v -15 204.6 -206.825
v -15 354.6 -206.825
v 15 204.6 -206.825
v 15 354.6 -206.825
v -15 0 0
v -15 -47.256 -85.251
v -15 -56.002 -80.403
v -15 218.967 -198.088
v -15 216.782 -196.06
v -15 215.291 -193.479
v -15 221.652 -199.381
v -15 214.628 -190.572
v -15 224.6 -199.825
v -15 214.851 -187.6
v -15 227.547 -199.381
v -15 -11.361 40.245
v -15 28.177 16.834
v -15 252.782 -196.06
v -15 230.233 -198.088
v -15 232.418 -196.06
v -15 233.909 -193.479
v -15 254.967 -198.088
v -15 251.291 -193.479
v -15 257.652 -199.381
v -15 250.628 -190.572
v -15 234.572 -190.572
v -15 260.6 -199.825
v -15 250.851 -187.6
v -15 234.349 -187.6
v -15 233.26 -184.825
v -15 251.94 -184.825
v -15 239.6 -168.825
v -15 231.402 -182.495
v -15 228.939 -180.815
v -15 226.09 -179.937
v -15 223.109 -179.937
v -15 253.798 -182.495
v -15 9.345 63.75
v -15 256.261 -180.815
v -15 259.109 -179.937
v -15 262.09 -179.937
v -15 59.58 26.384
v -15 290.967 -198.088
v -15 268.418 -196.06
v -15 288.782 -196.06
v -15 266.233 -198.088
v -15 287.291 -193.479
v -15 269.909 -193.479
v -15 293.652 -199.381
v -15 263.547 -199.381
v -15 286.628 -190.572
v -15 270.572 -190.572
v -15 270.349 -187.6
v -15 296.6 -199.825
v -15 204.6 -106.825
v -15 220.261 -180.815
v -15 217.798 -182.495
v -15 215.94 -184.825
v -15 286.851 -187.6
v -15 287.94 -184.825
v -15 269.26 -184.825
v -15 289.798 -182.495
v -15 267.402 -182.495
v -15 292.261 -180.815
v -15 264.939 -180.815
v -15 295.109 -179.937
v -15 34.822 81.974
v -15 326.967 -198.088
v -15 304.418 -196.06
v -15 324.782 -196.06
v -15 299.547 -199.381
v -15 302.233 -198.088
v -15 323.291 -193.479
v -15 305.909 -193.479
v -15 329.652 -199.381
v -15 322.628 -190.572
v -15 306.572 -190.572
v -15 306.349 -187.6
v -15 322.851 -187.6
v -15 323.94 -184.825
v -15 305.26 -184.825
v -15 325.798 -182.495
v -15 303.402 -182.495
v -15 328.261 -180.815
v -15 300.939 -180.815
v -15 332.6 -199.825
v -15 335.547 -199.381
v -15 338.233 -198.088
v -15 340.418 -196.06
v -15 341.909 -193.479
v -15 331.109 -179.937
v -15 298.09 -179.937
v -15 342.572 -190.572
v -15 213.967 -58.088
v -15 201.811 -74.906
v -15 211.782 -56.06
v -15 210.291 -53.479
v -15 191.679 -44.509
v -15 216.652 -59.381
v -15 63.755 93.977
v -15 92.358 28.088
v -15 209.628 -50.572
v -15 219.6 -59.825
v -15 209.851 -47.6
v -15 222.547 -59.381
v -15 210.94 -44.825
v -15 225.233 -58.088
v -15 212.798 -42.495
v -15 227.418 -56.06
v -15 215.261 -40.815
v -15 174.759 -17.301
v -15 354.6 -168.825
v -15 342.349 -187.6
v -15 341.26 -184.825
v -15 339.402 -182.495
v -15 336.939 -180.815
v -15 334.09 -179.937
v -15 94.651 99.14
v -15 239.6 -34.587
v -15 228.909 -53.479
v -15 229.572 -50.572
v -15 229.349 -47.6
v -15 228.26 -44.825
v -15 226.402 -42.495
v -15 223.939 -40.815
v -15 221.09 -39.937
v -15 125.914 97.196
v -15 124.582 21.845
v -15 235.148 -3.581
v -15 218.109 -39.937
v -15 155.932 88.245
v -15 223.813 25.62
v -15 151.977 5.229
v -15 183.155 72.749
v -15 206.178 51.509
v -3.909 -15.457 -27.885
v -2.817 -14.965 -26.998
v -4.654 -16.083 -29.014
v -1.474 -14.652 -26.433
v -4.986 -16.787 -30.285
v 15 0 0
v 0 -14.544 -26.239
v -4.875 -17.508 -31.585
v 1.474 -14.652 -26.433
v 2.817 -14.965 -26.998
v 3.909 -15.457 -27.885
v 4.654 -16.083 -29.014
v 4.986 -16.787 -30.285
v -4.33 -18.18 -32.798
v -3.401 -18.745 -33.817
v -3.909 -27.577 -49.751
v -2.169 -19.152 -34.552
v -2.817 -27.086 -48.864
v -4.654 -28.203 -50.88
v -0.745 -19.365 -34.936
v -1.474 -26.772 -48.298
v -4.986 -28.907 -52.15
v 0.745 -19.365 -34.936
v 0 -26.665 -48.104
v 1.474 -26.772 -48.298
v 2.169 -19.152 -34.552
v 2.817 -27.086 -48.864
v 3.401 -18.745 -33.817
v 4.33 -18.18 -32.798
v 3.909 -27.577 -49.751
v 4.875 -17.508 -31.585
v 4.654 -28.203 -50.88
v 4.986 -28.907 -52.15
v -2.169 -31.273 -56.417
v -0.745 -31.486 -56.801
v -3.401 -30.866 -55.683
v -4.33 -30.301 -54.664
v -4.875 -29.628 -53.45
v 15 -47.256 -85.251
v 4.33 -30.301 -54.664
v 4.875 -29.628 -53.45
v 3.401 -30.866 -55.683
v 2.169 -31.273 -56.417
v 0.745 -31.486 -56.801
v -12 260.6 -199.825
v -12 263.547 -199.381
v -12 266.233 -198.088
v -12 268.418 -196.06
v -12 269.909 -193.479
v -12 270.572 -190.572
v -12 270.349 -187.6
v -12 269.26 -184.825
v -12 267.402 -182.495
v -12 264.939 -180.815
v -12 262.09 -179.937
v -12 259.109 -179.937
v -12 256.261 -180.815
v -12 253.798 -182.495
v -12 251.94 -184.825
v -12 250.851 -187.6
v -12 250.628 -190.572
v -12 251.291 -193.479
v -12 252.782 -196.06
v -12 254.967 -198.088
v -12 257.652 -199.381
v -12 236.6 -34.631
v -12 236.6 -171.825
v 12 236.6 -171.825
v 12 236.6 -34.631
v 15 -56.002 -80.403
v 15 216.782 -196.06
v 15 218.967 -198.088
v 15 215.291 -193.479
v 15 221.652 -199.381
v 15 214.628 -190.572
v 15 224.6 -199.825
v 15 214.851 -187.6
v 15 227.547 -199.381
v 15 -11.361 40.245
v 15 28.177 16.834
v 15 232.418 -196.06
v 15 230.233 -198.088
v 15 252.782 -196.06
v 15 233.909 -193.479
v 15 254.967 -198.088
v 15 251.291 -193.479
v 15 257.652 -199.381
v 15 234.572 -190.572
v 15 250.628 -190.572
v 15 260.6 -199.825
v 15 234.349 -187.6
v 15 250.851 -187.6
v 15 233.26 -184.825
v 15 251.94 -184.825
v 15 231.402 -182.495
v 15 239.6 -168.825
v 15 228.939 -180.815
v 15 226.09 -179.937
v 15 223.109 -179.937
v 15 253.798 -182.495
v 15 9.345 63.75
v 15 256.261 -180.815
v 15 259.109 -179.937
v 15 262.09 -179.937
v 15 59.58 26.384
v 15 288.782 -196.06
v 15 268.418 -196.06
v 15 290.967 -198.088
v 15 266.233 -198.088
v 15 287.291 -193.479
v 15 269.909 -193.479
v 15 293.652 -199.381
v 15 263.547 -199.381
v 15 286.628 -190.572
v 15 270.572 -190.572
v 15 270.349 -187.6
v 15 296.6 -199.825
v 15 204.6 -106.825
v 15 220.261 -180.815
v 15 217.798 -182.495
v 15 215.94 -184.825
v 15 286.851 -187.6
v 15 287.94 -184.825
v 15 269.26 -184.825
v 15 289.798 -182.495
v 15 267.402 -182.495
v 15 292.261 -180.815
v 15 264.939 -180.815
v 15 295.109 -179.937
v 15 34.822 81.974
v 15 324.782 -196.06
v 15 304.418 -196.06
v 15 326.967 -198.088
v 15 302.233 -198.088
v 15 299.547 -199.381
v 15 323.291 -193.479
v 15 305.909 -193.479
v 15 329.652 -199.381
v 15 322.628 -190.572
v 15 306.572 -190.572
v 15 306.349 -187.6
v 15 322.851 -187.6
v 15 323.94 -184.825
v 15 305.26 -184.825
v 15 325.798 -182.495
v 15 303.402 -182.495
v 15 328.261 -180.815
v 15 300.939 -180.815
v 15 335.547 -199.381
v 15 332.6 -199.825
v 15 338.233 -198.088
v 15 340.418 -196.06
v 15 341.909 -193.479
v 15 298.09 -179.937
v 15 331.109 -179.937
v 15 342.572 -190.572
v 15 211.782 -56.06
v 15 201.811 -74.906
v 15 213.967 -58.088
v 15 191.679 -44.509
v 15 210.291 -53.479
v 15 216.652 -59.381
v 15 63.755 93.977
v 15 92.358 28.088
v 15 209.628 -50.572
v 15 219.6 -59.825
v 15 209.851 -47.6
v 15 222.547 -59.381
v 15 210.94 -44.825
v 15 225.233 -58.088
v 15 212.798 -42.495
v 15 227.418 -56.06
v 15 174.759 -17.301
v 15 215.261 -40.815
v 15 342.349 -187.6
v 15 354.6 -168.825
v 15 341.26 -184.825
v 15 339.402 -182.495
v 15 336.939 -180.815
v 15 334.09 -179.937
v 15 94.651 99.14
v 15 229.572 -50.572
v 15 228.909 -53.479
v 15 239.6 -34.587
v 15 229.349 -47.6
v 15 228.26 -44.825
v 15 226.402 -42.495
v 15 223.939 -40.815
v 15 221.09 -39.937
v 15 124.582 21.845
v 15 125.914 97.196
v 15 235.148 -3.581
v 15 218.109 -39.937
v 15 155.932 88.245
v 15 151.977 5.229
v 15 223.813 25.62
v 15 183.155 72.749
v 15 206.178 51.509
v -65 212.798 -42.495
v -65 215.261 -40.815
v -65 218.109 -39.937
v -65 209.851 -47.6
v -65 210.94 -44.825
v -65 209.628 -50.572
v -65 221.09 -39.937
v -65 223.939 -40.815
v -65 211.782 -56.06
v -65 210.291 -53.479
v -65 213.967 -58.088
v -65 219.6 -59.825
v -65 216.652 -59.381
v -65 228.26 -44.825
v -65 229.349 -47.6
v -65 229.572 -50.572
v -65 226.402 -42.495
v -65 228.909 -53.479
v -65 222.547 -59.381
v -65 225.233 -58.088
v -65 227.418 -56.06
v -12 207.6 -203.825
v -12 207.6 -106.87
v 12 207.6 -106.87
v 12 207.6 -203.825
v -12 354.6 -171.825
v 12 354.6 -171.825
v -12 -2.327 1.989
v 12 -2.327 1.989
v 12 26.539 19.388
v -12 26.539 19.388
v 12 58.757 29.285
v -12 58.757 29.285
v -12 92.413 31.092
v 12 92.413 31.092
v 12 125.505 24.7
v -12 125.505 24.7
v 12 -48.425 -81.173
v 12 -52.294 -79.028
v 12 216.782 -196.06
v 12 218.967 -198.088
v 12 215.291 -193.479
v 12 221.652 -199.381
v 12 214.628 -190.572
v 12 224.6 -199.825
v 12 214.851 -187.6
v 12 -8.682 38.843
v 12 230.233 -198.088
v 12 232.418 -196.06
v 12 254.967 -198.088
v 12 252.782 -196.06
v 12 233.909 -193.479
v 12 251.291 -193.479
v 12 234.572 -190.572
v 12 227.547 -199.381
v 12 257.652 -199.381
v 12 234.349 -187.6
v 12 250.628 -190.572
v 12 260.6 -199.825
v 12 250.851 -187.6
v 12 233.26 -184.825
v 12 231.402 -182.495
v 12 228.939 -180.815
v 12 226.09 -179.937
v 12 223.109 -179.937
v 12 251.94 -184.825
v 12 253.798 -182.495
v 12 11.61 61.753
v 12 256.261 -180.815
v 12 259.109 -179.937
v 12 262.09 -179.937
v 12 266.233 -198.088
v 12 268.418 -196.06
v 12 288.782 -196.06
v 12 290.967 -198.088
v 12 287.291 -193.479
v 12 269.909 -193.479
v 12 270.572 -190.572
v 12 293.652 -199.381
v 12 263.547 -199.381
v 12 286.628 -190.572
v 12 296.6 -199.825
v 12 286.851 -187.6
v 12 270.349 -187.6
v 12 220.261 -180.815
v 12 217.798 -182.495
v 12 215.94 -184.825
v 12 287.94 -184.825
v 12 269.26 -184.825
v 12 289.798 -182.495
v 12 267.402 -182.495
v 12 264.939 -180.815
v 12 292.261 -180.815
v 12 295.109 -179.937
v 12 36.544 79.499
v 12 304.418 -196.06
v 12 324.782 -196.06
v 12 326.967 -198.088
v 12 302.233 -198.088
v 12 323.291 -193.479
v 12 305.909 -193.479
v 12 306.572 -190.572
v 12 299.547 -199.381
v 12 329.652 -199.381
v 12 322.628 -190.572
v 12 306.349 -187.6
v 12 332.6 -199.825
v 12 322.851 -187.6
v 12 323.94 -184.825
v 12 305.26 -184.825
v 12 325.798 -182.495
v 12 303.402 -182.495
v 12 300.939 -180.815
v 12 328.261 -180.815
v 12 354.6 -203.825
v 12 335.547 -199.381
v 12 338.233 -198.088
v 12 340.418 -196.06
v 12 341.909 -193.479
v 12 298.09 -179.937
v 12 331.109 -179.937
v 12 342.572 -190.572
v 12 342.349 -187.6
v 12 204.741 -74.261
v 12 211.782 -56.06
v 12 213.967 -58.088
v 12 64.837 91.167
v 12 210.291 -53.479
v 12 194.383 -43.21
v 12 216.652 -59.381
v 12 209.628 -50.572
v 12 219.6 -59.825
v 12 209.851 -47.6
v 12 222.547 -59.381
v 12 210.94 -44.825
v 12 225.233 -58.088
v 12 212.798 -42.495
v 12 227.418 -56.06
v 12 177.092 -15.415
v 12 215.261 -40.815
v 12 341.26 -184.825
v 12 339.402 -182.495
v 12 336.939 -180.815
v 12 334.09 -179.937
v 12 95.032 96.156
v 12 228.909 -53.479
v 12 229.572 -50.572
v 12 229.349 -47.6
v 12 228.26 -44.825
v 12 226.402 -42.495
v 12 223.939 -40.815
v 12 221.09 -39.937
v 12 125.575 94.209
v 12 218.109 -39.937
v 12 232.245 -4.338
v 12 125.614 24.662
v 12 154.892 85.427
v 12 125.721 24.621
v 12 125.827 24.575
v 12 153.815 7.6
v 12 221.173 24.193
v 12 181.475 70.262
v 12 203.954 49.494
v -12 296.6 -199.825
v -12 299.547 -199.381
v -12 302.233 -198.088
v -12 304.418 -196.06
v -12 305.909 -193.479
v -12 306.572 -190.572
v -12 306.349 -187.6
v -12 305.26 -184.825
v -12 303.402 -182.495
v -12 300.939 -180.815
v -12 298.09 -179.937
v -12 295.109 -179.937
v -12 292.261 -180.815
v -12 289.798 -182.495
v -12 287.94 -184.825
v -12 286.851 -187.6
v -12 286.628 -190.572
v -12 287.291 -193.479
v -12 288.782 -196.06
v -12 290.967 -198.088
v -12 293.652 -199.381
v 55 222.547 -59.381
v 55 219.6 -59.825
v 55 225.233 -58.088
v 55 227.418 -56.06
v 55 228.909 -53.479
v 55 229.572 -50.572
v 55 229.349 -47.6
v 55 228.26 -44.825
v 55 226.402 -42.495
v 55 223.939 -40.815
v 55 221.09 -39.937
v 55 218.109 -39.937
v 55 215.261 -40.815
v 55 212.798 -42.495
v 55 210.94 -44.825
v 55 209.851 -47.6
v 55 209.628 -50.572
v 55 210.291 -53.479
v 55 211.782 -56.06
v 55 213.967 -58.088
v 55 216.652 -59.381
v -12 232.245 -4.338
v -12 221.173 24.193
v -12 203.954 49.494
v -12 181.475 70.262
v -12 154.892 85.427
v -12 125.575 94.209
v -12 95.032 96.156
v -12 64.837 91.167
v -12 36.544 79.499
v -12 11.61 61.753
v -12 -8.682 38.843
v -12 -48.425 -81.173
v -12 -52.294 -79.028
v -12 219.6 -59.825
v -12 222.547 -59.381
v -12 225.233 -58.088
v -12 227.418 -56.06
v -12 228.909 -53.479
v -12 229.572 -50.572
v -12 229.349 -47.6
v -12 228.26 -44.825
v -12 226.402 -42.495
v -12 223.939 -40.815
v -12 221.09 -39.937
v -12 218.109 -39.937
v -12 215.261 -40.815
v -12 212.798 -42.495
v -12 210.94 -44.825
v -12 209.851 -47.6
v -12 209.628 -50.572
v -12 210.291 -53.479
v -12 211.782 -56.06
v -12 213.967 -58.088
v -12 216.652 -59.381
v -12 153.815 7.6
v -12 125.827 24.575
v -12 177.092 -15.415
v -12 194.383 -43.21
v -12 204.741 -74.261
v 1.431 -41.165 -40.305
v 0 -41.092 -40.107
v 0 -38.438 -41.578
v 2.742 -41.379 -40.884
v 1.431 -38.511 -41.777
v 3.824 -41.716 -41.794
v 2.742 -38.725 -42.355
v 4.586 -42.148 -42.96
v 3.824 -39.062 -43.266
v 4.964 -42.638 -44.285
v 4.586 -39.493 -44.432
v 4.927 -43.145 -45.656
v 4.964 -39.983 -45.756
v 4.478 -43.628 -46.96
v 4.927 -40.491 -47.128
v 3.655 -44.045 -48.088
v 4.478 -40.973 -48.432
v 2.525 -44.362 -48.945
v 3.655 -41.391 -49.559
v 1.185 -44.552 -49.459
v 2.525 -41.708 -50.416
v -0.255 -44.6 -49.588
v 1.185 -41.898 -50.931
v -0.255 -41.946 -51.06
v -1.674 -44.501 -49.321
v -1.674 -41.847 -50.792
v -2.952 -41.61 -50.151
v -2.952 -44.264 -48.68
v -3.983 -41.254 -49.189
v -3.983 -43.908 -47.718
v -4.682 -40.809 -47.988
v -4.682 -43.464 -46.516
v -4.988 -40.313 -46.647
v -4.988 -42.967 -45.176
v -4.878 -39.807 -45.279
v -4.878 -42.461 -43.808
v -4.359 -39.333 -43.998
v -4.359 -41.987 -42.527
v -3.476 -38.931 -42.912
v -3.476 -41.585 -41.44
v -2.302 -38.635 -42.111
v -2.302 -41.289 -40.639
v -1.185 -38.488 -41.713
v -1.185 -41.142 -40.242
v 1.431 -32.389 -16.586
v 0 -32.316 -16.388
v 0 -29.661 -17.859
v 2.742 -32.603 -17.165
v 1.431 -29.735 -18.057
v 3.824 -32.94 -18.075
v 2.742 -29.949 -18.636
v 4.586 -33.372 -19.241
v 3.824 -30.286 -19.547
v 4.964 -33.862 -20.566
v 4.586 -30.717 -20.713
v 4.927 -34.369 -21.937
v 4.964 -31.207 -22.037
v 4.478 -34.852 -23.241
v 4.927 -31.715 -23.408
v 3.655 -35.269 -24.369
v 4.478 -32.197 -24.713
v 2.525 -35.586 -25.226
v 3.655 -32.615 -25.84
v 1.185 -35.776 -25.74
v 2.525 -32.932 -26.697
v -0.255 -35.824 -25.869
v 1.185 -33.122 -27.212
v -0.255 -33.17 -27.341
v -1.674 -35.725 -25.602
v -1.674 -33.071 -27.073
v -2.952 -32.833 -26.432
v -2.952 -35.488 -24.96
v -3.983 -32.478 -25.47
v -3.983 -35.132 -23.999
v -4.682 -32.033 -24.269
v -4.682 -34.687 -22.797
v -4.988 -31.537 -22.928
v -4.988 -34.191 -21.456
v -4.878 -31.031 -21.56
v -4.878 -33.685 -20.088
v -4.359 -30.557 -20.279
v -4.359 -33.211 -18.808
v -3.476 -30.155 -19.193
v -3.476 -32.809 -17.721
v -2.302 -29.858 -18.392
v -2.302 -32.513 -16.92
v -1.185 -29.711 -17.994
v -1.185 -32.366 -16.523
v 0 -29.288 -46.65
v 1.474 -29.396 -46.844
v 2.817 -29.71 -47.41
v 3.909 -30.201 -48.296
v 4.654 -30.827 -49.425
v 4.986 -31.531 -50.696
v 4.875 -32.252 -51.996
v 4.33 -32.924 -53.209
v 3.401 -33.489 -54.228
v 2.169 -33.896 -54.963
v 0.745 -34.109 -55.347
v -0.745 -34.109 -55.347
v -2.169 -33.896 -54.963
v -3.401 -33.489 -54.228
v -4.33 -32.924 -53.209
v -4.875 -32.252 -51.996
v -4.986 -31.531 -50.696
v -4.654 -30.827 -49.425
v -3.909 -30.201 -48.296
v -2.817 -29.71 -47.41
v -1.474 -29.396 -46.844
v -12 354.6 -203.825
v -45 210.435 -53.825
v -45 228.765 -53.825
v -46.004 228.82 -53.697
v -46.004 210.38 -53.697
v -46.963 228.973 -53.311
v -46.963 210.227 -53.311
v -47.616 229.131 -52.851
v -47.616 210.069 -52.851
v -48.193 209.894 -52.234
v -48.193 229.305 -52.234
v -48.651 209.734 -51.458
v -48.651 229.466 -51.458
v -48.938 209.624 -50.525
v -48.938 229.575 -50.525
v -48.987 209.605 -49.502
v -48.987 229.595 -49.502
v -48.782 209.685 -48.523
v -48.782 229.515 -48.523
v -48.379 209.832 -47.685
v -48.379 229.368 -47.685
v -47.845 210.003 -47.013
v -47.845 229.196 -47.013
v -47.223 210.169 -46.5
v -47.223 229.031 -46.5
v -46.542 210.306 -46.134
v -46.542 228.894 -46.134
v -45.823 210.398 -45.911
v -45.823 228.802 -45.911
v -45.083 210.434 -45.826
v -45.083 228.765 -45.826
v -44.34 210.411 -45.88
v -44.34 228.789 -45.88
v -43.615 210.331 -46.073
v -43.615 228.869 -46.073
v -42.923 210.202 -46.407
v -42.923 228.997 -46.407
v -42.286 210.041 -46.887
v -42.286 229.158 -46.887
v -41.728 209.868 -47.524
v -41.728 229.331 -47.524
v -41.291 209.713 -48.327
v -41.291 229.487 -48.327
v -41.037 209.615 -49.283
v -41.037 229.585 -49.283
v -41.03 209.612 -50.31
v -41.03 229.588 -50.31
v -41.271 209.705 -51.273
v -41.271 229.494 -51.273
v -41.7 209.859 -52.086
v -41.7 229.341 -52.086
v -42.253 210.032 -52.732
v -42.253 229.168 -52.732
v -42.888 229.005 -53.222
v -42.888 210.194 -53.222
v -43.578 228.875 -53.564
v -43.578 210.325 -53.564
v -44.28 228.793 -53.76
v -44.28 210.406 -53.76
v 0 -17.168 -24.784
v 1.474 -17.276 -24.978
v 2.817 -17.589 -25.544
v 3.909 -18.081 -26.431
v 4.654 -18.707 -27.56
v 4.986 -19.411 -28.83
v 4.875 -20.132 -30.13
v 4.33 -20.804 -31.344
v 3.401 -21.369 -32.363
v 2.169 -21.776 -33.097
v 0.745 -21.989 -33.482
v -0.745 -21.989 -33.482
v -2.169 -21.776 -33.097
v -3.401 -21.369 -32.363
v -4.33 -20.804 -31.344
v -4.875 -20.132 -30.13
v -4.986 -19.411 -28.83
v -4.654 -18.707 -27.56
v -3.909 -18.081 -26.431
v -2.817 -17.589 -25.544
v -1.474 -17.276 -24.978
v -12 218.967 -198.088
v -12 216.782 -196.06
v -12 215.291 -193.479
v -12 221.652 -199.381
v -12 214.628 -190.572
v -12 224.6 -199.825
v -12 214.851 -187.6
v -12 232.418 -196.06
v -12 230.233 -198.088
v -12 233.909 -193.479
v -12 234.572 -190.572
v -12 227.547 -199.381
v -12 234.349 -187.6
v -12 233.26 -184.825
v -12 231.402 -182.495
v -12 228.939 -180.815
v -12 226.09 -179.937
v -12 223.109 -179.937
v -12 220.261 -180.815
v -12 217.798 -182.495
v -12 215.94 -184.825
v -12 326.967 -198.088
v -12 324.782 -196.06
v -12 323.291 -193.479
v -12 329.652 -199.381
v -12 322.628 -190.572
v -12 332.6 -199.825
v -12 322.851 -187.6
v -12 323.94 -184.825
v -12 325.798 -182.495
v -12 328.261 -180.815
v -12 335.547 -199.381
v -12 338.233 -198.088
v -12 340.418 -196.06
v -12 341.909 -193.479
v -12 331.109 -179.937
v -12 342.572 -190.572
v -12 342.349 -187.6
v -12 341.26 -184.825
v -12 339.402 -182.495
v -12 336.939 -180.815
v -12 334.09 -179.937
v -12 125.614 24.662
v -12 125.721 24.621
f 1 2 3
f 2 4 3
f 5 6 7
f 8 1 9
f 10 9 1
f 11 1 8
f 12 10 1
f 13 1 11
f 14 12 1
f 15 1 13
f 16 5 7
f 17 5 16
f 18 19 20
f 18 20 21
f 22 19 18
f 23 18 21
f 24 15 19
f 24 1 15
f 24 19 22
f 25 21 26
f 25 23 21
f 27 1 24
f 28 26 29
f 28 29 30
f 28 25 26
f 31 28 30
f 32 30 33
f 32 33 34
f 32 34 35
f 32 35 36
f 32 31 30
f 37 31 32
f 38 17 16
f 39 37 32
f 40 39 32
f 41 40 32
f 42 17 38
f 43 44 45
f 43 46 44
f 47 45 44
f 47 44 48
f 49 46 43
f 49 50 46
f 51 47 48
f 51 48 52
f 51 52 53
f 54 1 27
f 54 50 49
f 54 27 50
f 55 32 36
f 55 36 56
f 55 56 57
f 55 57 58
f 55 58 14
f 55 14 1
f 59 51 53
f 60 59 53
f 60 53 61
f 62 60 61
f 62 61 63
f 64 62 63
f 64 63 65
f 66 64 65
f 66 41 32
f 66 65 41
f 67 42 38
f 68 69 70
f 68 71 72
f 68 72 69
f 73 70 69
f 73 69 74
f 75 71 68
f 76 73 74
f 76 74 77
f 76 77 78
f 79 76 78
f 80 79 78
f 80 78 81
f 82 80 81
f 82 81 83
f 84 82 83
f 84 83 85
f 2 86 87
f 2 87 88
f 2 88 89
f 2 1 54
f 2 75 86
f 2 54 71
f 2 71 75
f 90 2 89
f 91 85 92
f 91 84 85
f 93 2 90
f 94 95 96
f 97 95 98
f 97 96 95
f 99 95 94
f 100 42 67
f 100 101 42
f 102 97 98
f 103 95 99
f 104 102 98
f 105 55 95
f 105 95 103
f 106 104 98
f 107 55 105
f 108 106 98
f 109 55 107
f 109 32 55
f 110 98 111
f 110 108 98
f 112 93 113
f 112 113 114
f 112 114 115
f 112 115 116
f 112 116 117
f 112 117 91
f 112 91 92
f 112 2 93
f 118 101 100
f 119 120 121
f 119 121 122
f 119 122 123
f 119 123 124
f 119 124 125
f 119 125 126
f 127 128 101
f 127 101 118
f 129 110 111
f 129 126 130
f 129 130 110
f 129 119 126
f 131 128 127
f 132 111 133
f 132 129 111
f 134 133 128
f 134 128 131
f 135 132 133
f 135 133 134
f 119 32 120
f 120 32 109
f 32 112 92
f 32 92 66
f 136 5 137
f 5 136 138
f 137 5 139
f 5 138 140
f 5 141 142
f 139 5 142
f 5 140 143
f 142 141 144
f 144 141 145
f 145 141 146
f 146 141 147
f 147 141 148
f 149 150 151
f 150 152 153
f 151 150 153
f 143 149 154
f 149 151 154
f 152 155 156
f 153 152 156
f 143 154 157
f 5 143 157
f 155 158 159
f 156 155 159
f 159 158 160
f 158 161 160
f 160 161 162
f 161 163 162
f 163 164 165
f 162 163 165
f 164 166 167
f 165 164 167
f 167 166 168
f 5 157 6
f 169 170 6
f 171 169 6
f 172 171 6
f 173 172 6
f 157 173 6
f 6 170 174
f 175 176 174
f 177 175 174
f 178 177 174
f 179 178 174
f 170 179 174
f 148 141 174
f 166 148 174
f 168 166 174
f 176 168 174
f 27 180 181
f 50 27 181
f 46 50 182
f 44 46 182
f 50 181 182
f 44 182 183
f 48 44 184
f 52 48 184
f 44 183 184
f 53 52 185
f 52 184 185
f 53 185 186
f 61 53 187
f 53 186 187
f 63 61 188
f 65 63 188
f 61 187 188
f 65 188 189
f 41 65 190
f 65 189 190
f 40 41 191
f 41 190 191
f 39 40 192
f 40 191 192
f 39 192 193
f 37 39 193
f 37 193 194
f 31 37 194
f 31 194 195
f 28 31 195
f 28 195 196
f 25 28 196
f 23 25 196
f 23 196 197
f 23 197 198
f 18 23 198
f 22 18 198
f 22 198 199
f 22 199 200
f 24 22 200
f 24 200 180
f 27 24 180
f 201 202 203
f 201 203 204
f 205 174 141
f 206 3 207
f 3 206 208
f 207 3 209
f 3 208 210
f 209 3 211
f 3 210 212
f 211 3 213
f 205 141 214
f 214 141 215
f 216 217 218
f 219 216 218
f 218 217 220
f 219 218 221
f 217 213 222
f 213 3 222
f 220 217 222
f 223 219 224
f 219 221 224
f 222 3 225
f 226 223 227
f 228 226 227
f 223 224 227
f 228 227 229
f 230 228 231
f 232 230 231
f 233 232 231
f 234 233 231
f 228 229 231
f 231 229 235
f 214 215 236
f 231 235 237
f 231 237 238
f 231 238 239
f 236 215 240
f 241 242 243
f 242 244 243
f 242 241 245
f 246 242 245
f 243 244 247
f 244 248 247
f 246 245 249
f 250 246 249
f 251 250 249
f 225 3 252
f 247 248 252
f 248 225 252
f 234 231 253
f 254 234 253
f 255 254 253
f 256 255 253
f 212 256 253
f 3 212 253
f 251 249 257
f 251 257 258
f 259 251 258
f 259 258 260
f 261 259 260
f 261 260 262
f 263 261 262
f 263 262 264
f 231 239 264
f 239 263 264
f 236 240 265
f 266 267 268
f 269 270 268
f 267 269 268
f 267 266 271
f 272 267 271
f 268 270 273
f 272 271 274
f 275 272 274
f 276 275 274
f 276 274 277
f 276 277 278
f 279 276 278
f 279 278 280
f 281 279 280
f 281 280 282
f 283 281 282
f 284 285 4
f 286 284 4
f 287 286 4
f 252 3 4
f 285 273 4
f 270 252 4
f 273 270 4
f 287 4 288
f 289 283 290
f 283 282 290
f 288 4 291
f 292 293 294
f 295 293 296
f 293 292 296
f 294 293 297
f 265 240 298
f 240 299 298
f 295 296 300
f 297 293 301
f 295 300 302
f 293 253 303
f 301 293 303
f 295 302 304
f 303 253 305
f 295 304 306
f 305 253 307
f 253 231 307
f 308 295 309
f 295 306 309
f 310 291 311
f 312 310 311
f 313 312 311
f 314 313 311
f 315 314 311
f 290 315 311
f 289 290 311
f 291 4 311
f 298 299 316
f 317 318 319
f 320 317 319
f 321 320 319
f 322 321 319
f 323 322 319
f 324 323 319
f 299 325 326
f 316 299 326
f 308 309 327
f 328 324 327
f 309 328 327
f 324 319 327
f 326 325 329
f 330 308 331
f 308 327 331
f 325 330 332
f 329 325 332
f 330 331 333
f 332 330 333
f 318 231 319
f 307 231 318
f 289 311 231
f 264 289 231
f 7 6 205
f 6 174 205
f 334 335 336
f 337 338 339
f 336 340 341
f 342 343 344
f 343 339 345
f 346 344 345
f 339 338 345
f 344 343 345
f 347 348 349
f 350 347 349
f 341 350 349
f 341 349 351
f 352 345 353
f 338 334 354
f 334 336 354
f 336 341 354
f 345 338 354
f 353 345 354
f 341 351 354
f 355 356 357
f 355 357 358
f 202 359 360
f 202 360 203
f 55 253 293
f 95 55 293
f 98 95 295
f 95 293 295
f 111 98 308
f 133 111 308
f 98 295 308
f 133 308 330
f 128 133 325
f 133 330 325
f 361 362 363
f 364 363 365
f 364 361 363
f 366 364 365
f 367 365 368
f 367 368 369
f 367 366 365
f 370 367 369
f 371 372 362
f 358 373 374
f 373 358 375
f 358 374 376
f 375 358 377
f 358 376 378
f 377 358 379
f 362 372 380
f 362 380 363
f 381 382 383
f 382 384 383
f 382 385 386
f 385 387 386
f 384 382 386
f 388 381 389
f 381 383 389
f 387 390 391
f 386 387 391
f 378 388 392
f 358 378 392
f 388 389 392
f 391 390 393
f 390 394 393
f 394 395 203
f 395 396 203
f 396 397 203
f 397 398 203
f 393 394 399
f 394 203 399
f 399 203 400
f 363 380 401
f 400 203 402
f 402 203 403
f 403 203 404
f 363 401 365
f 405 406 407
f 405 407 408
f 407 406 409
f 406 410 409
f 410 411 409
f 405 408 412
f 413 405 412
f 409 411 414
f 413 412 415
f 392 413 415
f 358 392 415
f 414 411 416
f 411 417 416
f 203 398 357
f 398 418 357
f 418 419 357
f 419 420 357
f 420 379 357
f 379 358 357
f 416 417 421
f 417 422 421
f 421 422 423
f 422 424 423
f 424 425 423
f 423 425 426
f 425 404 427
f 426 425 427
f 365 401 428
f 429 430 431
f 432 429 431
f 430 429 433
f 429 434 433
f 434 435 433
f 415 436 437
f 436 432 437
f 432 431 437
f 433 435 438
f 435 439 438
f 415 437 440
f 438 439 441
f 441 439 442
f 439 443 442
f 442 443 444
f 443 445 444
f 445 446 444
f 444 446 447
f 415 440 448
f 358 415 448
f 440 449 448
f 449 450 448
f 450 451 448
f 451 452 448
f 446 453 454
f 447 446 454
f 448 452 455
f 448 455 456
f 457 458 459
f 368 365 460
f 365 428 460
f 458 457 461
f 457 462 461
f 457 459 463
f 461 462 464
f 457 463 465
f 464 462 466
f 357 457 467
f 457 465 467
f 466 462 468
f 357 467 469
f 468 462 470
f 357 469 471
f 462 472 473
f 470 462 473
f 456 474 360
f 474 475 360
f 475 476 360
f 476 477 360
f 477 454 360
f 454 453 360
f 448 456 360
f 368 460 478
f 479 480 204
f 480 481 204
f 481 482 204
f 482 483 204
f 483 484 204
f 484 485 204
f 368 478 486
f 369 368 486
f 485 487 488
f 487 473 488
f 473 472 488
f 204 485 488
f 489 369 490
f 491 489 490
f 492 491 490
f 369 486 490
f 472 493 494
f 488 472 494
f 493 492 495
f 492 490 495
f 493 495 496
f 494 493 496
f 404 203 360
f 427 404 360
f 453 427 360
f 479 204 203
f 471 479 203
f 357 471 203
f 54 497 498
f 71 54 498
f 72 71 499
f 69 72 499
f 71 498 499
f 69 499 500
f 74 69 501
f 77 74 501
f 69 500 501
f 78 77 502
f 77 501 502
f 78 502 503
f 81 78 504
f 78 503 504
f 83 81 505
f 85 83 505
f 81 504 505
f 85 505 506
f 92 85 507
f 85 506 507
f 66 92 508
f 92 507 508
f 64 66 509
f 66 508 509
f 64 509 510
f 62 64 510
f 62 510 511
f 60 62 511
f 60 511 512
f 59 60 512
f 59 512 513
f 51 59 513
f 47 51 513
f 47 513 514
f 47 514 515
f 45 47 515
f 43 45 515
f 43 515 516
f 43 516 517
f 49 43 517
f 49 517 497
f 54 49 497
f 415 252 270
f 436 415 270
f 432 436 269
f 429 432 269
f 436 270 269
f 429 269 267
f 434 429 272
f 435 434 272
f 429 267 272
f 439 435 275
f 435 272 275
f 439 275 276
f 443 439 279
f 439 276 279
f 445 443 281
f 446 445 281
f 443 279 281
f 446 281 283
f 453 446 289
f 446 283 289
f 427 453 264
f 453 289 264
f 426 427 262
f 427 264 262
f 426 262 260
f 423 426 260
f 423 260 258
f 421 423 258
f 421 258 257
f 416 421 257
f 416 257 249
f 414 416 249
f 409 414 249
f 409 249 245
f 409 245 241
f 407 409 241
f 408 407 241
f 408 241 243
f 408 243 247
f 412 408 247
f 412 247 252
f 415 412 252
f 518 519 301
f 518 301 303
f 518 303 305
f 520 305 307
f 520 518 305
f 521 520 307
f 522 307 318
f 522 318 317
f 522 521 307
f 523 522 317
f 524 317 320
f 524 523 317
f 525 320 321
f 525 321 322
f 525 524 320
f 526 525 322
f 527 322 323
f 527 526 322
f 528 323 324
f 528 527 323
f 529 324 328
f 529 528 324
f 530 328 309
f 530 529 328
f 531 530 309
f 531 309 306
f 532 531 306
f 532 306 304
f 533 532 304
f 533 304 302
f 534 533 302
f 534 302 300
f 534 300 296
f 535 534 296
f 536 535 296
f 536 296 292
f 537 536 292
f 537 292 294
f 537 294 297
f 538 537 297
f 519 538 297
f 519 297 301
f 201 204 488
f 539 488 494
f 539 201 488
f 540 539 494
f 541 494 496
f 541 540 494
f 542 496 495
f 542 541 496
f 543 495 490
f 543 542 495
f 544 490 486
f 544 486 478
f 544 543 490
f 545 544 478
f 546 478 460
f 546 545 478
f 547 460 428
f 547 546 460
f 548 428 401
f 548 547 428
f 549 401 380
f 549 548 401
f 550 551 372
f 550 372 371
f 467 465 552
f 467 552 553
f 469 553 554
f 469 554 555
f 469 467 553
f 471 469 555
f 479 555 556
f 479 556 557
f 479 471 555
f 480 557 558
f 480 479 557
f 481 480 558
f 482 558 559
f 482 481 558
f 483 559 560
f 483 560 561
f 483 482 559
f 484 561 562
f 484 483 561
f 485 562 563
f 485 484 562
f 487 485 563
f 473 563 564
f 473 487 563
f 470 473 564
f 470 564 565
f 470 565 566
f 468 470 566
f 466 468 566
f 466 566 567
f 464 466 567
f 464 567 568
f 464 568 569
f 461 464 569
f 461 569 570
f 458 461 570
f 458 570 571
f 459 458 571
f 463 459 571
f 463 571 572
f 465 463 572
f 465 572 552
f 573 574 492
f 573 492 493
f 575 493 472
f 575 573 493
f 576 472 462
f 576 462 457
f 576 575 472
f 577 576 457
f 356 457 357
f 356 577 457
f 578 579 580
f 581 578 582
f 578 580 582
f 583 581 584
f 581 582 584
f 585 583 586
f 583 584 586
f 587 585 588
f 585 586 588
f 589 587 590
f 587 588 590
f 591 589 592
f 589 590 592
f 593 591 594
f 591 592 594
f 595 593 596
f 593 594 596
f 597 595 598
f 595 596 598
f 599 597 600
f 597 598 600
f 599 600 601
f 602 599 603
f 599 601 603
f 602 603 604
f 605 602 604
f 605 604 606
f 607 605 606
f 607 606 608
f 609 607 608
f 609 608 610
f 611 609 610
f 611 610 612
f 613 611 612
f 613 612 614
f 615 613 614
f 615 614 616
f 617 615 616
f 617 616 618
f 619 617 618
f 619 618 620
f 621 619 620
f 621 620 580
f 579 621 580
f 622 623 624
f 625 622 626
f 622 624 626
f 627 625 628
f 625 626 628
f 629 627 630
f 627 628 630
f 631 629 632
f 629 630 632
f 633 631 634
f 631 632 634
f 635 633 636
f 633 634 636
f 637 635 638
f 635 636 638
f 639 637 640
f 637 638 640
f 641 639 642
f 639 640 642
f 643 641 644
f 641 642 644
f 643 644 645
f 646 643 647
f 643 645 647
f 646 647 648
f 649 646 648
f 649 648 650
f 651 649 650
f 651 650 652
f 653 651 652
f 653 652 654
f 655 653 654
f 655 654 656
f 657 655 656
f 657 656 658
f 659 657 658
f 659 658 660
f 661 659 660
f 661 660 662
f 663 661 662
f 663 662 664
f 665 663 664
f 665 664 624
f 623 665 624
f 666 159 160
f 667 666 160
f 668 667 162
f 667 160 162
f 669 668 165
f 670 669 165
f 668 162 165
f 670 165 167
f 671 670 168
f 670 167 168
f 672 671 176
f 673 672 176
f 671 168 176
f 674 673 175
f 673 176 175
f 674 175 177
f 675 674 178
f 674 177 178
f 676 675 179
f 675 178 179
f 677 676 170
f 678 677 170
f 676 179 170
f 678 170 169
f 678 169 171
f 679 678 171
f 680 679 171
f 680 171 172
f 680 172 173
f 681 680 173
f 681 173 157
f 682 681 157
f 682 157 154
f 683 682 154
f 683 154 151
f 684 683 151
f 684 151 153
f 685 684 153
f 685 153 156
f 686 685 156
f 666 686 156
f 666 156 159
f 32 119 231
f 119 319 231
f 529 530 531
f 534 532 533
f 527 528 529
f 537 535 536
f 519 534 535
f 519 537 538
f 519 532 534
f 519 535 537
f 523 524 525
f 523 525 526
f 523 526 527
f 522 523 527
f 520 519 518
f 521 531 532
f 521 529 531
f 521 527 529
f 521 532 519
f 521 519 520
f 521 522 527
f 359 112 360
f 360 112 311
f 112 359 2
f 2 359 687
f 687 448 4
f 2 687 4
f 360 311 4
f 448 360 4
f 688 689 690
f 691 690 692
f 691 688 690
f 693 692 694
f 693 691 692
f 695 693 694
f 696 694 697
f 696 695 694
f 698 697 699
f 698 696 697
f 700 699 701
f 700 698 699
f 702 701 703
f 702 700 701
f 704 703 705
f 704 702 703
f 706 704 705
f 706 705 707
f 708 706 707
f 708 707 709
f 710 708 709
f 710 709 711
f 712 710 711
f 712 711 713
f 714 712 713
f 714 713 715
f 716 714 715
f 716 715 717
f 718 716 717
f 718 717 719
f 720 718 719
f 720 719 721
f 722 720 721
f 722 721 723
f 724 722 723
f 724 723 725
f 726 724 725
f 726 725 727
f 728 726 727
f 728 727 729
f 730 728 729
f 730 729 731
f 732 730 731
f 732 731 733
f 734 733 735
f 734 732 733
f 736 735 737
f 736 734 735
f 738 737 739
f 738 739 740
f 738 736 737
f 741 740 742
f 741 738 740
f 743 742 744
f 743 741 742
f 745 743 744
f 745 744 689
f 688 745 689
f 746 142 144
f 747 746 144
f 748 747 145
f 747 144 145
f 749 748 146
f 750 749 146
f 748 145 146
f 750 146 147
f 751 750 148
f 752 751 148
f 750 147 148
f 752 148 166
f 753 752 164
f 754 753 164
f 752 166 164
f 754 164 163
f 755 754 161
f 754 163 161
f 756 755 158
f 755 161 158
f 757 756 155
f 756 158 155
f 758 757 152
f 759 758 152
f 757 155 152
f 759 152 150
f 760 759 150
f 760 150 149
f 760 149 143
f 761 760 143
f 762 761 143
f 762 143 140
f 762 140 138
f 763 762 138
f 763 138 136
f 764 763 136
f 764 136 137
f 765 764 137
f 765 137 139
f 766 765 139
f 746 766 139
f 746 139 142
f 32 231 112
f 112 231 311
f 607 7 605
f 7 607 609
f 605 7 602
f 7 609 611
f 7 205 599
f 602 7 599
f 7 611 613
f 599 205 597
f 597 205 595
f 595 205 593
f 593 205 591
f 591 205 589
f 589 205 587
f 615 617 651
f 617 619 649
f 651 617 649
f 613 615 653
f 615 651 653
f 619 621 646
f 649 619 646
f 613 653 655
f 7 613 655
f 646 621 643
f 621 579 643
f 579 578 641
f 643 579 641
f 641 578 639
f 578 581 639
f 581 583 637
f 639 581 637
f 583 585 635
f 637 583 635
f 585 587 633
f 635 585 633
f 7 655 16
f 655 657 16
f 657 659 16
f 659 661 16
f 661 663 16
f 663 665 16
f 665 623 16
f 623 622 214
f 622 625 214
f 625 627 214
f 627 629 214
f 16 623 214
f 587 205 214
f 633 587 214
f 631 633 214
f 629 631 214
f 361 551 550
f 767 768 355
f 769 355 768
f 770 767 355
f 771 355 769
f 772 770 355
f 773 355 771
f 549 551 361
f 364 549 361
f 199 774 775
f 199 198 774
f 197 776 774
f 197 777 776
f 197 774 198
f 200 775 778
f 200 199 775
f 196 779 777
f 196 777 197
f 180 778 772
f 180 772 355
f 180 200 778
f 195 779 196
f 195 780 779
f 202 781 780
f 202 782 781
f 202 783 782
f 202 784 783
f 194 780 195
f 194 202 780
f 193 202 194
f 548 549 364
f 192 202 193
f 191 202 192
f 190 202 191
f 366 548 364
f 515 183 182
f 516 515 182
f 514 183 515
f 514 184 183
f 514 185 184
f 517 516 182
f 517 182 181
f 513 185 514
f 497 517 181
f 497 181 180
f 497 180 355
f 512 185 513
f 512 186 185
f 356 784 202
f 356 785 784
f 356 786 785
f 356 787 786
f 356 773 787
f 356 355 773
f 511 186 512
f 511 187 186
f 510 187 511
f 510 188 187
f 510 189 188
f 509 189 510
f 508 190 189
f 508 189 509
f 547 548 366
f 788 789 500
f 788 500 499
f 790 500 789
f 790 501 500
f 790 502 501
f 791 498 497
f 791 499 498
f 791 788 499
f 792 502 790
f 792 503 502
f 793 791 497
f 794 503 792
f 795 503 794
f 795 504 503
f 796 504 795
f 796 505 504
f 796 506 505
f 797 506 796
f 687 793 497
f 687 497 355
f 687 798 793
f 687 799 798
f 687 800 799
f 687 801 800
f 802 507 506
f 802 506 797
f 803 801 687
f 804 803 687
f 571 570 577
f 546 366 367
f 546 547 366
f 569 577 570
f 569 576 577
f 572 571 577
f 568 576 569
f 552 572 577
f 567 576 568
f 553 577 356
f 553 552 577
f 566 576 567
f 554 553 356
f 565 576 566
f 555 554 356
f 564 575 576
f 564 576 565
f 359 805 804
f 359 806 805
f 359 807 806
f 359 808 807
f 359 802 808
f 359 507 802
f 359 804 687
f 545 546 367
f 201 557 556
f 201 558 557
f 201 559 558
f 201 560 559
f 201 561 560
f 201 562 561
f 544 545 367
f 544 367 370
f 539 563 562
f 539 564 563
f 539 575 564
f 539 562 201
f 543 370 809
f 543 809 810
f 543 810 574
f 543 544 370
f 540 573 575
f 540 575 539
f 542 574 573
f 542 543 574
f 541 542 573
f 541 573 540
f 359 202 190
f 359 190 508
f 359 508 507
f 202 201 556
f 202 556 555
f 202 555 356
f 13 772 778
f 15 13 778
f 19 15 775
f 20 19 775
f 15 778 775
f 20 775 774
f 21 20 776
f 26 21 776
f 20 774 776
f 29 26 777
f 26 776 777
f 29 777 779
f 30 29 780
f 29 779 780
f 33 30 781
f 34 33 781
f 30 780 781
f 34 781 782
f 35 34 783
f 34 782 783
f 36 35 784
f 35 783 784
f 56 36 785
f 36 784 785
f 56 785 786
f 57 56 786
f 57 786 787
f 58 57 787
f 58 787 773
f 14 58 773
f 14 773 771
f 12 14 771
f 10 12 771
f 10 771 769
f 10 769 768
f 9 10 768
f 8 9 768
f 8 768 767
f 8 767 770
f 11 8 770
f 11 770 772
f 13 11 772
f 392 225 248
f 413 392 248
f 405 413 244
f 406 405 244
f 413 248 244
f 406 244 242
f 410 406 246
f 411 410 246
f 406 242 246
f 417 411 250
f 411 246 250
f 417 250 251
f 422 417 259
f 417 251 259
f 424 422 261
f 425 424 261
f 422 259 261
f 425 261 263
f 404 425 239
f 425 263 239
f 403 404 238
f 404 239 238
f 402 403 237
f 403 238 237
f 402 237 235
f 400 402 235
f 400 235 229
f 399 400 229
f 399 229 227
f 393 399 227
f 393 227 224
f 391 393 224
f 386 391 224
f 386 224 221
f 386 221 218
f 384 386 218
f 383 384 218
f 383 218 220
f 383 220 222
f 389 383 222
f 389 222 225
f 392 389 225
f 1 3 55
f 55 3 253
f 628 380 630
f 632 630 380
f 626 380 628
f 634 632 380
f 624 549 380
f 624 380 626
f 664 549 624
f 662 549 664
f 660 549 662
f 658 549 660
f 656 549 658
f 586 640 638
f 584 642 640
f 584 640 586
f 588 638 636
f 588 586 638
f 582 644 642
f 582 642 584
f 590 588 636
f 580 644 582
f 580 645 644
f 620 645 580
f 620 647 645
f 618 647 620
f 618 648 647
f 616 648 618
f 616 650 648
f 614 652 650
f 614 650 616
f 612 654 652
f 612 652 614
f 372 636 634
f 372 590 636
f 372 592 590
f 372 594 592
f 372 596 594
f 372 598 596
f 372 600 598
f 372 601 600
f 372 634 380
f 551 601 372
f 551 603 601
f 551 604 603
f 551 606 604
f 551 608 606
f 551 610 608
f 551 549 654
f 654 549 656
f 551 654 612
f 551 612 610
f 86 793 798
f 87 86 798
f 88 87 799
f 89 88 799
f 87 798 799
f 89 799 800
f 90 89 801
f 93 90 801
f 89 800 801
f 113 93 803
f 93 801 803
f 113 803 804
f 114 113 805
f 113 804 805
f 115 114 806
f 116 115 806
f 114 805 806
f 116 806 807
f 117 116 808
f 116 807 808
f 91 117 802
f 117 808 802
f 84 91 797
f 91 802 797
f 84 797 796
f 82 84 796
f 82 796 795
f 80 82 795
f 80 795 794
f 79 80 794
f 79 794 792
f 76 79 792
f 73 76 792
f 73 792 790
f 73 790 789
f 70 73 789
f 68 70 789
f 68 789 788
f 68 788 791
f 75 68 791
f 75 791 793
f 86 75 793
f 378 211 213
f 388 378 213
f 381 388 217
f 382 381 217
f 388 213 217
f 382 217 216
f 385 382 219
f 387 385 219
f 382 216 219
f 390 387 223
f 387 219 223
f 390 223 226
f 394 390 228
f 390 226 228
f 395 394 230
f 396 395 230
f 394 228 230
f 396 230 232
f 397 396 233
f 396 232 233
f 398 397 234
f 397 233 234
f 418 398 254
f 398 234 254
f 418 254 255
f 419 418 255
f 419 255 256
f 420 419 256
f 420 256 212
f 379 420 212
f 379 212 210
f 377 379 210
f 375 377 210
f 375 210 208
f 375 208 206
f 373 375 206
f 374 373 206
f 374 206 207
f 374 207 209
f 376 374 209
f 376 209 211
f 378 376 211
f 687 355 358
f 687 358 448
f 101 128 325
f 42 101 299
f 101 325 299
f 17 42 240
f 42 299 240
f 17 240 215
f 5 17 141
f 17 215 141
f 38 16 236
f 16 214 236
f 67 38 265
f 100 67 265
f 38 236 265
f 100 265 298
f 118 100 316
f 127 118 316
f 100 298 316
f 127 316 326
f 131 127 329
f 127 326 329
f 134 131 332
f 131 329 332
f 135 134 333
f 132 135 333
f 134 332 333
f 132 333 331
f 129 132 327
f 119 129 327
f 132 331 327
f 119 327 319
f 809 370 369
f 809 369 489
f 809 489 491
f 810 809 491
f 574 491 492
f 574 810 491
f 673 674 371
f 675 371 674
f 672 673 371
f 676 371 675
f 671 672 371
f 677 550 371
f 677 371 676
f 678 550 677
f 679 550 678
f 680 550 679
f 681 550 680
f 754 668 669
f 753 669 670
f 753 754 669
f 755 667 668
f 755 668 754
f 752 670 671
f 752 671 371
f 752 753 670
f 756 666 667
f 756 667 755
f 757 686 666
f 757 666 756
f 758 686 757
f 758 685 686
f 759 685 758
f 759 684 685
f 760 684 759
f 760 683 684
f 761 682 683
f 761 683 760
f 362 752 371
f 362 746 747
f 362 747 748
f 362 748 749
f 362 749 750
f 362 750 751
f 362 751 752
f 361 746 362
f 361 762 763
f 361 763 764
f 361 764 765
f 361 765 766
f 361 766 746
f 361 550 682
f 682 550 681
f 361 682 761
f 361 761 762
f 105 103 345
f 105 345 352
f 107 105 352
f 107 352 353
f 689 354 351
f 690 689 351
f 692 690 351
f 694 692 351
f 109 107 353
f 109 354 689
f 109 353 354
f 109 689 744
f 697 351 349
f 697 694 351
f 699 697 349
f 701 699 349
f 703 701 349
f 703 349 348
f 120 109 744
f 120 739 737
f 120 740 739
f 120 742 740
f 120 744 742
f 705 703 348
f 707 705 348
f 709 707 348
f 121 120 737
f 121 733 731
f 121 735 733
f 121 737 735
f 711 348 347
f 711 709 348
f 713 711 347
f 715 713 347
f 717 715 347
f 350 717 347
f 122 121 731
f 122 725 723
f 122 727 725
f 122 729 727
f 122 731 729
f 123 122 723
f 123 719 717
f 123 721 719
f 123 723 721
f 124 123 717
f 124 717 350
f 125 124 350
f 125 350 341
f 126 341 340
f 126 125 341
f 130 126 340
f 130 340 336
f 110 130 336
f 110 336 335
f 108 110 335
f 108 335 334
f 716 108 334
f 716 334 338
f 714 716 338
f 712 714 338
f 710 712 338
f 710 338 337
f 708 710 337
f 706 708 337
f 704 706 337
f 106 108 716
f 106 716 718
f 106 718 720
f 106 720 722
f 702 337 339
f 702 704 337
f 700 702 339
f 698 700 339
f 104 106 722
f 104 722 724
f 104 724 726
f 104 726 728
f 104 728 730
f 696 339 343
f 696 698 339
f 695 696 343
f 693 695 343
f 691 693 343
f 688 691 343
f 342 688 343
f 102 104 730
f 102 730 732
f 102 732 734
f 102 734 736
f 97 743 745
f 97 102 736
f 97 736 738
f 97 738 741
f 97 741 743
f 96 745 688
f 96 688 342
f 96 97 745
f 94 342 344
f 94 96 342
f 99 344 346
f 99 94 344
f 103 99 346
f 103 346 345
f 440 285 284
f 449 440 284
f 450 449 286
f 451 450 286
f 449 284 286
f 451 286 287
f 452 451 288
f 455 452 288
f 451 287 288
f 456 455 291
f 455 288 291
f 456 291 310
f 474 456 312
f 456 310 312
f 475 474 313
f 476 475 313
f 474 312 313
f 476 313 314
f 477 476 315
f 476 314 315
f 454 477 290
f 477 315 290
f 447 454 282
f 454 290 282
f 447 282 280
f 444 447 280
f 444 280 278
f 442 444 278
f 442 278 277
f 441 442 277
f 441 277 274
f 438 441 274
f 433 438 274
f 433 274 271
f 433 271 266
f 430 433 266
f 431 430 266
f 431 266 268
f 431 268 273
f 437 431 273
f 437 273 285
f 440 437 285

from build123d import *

# Parameters (mm, degrees)
BOSS_EXTRUDE1_DEPTH = 15
SHELL1_START        = -12
SHELL1_DEPTH        = 24
SKETCH3_R           = 10
CUT_EXTRUDE2_DEPTH  = 412.603799071
BOSS_EXTRUDE2_START = 40
SKETCH4_R           = 10
BOSS_EXTRUDE2_DEPTH = 120
LPATTERN1_COUNT     = 4
LPATTERN1_PITCH     = 36
SKETCH6_R           = 5
CUT_EXTRUDE3_DEPTH  = 416.623251767
CUT_EXTRUDE4_REACH  = 417.623
SKETCH7_R           = 4


# Read off the part's stored shape, not the designer's step: Shell1
with BuildPart() as part:
    # Sketch1 → Boss-Extrude1 (new, symmetric)
    with BuildSketch(Plane(origin=(0, 0, 0), x_dir=(0, 0, -1), z_dir=(1, 0, 0))):
        with BuildLine():
            Line((0, 0), (85.251371582, -47.255606917))
            Line((85.251371582, -47.255606917), (80.40327538, -56.001803988))
            Line((80.40327538, -56.001803988), (-40.245063676, -11.361449965))
            ThreePointArc((-40.245063676, -11.361449965), (-93.575565654, 141.17838747), (34.587469981, 239.599831994))
            Line((34.587469981, 239.599831994), (168.825159395, 239.599831994))
            Line((168.825159395, 239.599831994), (168.825159395, 354.599831994))
            Line((168.825159395, 354.599831994), (206.825159395, 354.599831994))
            Line((206.825159395, 354.599831994), (206.825159395, 204.599831994))
            Line((206.825159395, 204.599831994), (106.825159395, 204.599831994))
            ThreePointArc((106.825159395, 204.599831994), (30.408436566, 184.017865838), (-21.845490063, 124.581611838))
            ThreePointArc((-21.845490063, 124.581611838), (-26.384125187, 59.579639949), (0, 0))
        make_face()
    extrude(amount=BOSS_EXTRUDE1_DEPTH, both=True)

    # Shell1 outline → Shell1 (cut)
    with BuildSketch(Plane.YZ.offset(SHELL1_START)):
        with BuildLine():
            ThreePointArc((125.505371341, 24.69972698), (125.667778254, 24.641959892), (125.826599381, 24.574960703))
            ThreePointArc((125.826599381, 24.574960703), (186.553407601, -28.804836135), (207.599831994, -106.870164943))
            Line((207.599831994, -106.870164943), (207.599831994, -203.825159395))
            Line((207.599831994, -203.825159395), (354.599831994, -203.825159395))
            Line((354.599831994, -203.825159395), (354.599831994, -171.825159395))
            Line((354.599831994, -171.825159395), (236.599831994, -171.825159395))
            Line((236.599831994, -171.825159395), (236.599831994, -34.630851514))
            ThreePointArc((236.599831994, -34.630851514), (140.483066901, 90.652257864), (-8.681515002, 38.842823077))
            Line((-8.681515002, 38.842823077), (-52.294295287, -79.028318808))
            Line((-52.294295287, -79.028318808), (-48.425037178, -81.1730836))
            Line((-48.425037178, -81.1730836), (-2.327347545, 1.989349905))
            ThreePointArc((-2.327347545, 1.989349905), (58.757023973, 29.285300463), (125.505371341, 24.69972698))
        make_face()
    extrude(amount=SHELL1_DEPTH, mode=Mode.SUBTRACT)

    # Sketch3 → Cut-Extrude2 (cut, through all)
    with BuildSketch(Plane(origin=(15, 0, 0), x_dir=(0, 0, -1), z_dir=(1, 0, 0))):
        with Locations((189.825159395, 224.599831994)):
            Circle(SKETCH3_R)
    cut_extrude2 = extrude(amount=-CUT_EXTRUDE2_DEPTH, mode=Mode.SUBTRACT)

    # Sketch4 → Boss-Extrude2 (add)
    with BuildSketch(Plane(origin=(15, 0, 0), x_dir=(0, 0, -1), z_dir=(1, 0, 0)).offset(BOSS_EXTRUDE2_START)):
        with Locations((49.825159395, 219.599831994)):
            Circle(SKETCH4_R)
    extrude(amount=-BOSS_EXTRUDE2_DEPTH)

    # LPattern1: Cut-Extrude2 ×4
    with Locations(*[(0, i * LPATTERN1_PITCH, 0) for i in range(1, LPATTERN1_COUNT)]):
        add(cut_extrude2, mode=Mode.SUBTRACT)

    # Sketch6 → Cut-Extrude3 (cut, through all)
    with BuildSketch(Plane(origin=(0, 0, 0), x_dir=(1, 0, 0), z_dir=(0, 0.8746197071393954, -0.48480962024633795))):
        with Locations(Location((0, 35, 0), (0, 0, 270))):
            Circle(SKETCH6_R)
        with Locations(Location((0, 60, 0), (0, 0, 270))):
            Circle(SKETCH6_R)
    extrude(amount=-CUT_EXTRUDE3_DEPTH, mode=Mode.SUBTRACT)

    # Sketch7 → Cut-Extrude4 (cut, up to next)
    with BuildSketch(Plane(origin=(0, 0, 0), x_dir=(1, 0, 0), z_dir=(0, 1, 0)), mode=Mode.PRIVATE) as cut_extrude4_sk1:
        with Locations(Location((-45, 49.825159395, 0), (0, 0, 90))):
            Circle(SKETCH7_R)
    cut_extrude4_tool1 = extrude(cut_extrude4_sk1.sketch, amount=CUT_EXTRUDE4_REACH, mode=Mode.PRIVATE) & part.part
    add(cut_extrude4_tool1.solids().sort_by_distance((-45, 0, -49.825159))[0], mode=Mode.SUBTRACT)


solid = part.part
